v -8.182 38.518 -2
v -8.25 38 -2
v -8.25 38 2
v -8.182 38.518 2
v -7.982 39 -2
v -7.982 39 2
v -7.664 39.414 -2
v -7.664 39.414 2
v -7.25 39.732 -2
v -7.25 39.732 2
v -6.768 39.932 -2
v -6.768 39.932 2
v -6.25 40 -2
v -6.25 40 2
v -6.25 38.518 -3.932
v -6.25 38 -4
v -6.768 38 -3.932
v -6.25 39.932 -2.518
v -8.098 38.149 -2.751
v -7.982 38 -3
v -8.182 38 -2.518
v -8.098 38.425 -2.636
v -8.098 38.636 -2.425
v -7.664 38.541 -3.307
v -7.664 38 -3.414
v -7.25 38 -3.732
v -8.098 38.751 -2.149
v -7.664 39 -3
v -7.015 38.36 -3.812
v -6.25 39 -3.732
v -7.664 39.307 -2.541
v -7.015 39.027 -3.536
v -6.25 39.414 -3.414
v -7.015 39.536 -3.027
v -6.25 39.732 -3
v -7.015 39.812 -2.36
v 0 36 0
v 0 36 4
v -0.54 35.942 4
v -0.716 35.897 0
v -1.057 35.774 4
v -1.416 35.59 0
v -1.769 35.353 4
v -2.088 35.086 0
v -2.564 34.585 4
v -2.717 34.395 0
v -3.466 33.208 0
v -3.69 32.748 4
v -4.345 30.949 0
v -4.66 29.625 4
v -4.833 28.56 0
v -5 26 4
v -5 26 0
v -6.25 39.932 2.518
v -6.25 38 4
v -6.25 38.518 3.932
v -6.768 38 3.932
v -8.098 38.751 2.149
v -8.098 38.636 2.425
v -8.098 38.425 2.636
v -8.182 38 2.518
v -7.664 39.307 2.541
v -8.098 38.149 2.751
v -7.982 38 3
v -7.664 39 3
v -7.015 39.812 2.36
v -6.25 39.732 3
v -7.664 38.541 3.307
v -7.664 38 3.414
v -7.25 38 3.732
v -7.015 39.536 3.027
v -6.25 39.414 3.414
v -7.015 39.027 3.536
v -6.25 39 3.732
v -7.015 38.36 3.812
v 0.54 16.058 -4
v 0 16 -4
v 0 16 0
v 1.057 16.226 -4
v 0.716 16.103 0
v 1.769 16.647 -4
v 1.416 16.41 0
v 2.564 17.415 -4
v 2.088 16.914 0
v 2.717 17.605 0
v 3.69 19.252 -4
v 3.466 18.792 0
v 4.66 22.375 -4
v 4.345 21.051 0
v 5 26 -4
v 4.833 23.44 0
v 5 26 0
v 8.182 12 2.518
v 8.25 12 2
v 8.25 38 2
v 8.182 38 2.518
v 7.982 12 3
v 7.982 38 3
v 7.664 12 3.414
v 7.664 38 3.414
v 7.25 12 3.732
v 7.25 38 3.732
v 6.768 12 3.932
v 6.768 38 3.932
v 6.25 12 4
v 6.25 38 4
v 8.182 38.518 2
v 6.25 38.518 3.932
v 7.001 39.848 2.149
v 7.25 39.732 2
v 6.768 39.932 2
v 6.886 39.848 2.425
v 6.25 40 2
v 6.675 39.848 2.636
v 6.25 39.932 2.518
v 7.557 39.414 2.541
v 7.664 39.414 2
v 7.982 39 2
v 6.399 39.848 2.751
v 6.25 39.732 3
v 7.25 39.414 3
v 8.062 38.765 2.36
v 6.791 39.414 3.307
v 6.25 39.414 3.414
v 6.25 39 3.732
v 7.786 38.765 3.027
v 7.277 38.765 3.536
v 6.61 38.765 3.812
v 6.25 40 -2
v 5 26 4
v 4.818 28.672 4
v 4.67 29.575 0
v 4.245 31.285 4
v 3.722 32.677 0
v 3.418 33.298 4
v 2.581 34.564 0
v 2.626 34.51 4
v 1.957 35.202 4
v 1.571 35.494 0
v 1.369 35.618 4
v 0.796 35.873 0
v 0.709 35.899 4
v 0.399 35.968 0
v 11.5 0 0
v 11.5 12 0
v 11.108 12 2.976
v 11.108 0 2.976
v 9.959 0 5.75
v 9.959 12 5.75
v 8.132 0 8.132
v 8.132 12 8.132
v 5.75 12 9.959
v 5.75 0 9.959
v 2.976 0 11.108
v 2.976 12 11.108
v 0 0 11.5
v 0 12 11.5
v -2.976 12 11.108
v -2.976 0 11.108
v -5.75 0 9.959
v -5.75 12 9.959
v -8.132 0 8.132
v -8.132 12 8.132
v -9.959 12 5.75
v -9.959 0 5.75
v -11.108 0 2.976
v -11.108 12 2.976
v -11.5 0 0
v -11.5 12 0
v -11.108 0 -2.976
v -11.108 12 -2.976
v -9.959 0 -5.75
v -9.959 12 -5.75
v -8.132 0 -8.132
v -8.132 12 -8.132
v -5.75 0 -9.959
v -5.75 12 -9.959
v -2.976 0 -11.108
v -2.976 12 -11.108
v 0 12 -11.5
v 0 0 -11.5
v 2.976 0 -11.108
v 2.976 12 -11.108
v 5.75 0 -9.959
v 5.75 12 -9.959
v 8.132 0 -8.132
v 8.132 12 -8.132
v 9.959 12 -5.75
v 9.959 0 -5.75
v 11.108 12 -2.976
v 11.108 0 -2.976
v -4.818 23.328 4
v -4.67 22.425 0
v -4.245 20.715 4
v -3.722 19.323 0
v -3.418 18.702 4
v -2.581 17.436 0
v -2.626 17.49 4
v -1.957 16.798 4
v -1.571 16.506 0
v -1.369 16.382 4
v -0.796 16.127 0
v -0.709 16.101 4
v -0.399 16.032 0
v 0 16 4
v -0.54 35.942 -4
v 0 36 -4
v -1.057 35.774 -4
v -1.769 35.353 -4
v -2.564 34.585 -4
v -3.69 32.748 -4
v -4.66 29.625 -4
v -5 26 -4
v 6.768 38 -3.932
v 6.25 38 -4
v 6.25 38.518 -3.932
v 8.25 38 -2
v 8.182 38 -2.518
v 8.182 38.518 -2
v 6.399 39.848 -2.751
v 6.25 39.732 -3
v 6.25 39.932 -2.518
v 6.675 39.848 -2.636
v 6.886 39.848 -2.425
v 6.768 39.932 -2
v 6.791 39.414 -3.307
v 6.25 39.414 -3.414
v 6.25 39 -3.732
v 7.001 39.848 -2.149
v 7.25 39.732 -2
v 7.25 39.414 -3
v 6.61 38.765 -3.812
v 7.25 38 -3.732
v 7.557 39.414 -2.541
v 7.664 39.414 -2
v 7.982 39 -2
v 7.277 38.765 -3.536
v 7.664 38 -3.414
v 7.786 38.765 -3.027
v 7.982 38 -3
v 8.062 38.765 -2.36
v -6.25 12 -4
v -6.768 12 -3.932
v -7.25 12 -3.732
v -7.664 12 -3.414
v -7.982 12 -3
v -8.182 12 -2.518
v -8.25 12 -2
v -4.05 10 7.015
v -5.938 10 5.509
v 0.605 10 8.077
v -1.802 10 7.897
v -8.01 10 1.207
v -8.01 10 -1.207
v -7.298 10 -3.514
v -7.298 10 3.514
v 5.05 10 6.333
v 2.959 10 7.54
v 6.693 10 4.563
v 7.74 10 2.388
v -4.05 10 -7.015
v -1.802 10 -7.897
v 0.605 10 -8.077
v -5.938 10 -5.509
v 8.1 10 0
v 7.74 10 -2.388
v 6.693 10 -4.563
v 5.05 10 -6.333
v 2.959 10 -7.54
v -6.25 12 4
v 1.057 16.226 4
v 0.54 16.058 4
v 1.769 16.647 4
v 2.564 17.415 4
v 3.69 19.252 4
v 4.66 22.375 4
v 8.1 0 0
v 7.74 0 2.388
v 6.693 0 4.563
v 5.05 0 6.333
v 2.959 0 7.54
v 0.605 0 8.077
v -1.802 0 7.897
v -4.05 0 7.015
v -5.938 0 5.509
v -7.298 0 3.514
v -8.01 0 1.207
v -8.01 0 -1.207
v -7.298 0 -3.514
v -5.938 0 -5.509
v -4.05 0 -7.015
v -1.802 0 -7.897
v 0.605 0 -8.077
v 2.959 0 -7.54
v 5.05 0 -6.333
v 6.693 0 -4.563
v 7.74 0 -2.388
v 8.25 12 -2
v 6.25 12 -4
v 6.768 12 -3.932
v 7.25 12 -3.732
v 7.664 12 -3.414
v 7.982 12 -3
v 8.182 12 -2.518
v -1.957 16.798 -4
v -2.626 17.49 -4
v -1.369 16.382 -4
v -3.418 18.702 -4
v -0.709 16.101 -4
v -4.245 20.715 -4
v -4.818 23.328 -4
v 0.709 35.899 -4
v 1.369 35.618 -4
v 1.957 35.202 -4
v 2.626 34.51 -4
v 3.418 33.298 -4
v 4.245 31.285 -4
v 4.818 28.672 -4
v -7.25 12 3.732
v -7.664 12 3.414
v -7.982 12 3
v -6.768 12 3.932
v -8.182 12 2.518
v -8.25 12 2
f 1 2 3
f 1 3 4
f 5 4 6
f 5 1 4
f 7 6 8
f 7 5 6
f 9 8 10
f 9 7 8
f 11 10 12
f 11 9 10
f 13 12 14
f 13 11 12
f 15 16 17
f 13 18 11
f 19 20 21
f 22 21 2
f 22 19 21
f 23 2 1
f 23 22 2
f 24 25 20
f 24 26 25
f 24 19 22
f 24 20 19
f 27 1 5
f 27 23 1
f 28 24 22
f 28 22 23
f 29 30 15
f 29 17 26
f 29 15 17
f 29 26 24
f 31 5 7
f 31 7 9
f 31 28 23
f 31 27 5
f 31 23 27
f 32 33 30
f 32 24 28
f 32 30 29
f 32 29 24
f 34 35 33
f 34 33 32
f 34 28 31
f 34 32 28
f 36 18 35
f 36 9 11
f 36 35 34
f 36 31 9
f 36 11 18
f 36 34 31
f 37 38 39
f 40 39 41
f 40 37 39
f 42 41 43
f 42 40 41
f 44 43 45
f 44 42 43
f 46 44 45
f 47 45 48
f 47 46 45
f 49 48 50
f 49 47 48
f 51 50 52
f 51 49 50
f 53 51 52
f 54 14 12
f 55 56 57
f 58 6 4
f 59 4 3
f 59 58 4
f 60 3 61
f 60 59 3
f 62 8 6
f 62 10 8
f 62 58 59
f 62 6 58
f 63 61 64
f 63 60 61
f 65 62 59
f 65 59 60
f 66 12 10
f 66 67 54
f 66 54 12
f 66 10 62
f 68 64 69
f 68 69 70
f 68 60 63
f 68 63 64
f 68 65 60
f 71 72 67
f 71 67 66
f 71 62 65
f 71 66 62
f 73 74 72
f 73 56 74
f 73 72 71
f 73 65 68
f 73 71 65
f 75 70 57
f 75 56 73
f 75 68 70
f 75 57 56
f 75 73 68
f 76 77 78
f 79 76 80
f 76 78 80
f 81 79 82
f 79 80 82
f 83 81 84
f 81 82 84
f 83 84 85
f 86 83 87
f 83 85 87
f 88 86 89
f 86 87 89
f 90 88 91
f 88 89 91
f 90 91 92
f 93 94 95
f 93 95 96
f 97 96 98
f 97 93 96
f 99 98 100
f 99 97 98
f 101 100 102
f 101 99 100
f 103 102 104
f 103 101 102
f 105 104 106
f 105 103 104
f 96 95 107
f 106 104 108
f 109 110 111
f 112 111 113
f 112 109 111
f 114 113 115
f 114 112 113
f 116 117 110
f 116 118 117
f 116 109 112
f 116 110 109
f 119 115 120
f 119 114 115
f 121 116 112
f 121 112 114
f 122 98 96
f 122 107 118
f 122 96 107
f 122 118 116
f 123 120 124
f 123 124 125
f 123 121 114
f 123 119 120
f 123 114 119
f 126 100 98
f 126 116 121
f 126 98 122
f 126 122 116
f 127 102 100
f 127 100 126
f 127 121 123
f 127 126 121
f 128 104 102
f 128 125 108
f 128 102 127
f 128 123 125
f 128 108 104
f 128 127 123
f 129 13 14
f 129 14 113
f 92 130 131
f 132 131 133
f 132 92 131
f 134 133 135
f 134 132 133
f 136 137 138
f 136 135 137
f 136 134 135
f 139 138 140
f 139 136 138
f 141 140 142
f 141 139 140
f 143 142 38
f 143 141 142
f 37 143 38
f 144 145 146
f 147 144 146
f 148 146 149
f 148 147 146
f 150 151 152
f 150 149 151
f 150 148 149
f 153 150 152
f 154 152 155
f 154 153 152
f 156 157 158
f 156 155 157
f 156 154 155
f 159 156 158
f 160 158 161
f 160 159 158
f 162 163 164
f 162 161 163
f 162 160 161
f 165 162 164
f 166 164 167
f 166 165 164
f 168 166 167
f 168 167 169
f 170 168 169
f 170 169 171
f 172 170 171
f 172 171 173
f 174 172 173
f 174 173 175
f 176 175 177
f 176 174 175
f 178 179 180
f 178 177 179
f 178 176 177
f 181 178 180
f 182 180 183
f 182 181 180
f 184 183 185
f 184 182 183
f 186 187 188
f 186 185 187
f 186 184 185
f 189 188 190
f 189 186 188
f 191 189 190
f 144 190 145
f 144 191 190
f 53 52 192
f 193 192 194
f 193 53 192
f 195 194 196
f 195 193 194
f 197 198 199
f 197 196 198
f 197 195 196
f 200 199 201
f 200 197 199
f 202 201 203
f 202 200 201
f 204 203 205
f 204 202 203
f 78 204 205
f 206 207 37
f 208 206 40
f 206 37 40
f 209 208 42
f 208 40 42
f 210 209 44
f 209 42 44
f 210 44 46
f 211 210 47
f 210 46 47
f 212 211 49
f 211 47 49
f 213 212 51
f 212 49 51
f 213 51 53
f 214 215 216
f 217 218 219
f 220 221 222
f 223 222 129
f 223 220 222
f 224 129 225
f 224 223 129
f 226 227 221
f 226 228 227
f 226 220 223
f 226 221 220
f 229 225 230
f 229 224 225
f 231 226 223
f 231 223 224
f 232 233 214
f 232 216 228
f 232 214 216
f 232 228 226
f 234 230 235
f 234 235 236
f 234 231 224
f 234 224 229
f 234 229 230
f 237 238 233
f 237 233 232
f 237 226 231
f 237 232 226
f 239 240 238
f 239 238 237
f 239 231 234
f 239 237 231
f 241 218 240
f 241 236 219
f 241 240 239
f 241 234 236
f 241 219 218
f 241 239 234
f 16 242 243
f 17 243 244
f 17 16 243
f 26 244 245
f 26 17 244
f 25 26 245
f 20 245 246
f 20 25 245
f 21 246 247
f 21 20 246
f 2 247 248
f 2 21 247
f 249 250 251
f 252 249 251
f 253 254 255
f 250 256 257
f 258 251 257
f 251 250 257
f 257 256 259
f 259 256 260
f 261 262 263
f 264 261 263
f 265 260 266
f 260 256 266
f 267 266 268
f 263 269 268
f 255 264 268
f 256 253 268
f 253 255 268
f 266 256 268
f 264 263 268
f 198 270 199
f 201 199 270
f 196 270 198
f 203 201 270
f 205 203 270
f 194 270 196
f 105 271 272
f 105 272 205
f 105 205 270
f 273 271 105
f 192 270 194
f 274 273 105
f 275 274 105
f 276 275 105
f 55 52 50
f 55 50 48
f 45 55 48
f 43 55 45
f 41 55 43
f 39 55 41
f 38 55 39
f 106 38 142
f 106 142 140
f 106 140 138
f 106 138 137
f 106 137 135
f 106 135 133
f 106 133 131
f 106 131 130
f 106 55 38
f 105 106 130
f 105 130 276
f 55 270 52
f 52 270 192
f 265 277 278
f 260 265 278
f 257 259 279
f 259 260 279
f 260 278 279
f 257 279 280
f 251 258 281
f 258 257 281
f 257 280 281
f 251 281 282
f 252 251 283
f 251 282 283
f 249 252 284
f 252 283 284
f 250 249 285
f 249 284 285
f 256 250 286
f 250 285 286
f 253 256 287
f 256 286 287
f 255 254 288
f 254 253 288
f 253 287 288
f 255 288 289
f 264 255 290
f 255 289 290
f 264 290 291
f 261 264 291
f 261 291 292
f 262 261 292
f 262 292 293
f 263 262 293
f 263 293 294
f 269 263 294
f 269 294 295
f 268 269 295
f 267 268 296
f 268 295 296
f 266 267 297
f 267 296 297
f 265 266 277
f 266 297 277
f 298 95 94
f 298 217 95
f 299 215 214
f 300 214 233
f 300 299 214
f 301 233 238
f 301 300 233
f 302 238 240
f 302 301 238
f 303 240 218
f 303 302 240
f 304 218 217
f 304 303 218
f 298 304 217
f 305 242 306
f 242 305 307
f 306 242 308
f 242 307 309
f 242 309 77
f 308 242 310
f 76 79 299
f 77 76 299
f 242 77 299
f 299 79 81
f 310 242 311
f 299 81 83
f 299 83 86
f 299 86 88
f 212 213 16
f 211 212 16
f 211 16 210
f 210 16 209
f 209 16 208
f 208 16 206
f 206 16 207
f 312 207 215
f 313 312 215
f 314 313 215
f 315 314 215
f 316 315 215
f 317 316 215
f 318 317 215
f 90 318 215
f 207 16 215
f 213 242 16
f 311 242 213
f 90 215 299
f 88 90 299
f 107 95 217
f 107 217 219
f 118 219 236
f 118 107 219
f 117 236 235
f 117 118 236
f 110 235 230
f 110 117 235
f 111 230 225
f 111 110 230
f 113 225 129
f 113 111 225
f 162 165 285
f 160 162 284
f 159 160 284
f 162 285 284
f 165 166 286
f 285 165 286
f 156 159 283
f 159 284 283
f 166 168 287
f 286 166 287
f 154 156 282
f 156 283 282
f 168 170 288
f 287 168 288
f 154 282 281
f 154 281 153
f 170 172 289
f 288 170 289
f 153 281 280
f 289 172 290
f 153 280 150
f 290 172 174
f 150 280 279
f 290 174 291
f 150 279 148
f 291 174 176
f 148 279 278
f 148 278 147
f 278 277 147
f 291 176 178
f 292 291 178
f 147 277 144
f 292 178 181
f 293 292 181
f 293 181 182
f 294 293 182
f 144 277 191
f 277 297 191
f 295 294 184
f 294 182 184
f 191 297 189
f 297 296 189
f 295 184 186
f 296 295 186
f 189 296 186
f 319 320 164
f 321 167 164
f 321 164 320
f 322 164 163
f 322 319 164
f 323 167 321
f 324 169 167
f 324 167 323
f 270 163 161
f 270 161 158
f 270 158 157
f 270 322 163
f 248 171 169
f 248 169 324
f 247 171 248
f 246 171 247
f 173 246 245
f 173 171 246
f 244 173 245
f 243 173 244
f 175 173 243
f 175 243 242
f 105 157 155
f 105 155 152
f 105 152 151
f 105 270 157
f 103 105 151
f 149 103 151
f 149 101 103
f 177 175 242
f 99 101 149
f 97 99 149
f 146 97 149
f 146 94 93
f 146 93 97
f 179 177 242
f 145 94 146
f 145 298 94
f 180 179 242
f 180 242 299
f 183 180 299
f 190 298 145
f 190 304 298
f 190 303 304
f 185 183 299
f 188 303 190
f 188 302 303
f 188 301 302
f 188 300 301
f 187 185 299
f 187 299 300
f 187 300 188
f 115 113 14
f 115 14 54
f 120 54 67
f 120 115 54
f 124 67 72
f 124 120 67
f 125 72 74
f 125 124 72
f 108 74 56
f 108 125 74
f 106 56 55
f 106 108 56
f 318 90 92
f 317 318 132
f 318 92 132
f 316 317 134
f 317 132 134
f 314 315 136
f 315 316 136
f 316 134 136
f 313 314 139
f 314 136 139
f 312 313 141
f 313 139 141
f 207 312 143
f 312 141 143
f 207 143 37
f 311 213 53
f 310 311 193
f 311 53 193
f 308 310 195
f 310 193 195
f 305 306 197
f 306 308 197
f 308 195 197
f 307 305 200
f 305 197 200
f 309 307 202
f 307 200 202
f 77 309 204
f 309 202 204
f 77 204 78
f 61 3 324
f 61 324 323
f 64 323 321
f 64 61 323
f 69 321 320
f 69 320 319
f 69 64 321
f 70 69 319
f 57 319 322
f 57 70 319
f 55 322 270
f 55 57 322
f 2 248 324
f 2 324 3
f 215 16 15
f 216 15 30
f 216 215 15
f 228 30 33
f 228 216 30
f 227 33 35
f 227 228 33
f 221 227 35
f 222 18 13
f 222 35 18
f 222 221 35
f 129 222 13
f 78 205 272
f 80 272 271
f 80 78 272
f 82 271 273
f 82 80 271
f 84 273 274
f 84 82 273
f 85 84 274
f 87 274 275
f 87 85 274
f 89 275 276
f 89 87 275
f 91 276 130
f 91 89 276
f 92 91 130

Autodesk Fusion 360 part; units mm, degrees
sketch "Sketch1" plane through (0, 0, 0) normal (0, 1, 0) x (1, 0, 0)
  circle A0 centre (0, 0) radius 8.1
  circle A1 centre (0, 0) radius 11.5
  dimension "d1" = 16.2
  dimension "d2" = 23
extrude "Extrude1" add sketch "Sketch1" along normal blind 10
extrude "Extrude2" add sketch "Sketch1" along normal blind 2 from surface at 10 contours A0 | A1
sketch "Sketch2" plane through (0, 0, 0) normal (0, 0, 1) x (1, 0, 0)
  ellipse E0 centre (0, 26) end of major axis (0, 36) minor radius 5
  line L0 (0, 16) -> (0, 36)
  line L1 (5, 26) -> (-5, 26)
  dimension "d8" = 20
  dimension "d9" = 10
  dimension "d10" = 26
sketch "Sketch3" plane through (0, 0, 0) normal (0, 0, 1) x (1, 0, 0)
  line L0 (8.25, 12) -> (-8.25, 12)
  line L1 (-8.25, 12) -> (-8.25, 40)
  line L2 (-8.25, 40) -> (8.25, 40)
  line L3 (8.25, 40) -> (8.25, 12)
  line L4 (8.25, 12) -> (-8.25, 40) construction
  line L5 (-8.25, 12) -> (8.25, 40) construction
  point P0 (0, 26)
  dimension "d11" = 16.5
  dimension "d12" = 28
  dimension "d13" = 12
extrude "Extrude3" add sketch "Sketch3" along normal mid plane 8
extrude "Extrude4" cut sketch "Sketch2" along normal mid plane 20
fillet "Fillet1" radius 2 8 edges at (8.25, 26, 4) (8.25, 26, -4) (0, 40, 4) (0, 40, -4) (8.25, 40, 0) (-8.25, 40, 0) (-8.25, 26, 4) (-8.25, 26, -4)
